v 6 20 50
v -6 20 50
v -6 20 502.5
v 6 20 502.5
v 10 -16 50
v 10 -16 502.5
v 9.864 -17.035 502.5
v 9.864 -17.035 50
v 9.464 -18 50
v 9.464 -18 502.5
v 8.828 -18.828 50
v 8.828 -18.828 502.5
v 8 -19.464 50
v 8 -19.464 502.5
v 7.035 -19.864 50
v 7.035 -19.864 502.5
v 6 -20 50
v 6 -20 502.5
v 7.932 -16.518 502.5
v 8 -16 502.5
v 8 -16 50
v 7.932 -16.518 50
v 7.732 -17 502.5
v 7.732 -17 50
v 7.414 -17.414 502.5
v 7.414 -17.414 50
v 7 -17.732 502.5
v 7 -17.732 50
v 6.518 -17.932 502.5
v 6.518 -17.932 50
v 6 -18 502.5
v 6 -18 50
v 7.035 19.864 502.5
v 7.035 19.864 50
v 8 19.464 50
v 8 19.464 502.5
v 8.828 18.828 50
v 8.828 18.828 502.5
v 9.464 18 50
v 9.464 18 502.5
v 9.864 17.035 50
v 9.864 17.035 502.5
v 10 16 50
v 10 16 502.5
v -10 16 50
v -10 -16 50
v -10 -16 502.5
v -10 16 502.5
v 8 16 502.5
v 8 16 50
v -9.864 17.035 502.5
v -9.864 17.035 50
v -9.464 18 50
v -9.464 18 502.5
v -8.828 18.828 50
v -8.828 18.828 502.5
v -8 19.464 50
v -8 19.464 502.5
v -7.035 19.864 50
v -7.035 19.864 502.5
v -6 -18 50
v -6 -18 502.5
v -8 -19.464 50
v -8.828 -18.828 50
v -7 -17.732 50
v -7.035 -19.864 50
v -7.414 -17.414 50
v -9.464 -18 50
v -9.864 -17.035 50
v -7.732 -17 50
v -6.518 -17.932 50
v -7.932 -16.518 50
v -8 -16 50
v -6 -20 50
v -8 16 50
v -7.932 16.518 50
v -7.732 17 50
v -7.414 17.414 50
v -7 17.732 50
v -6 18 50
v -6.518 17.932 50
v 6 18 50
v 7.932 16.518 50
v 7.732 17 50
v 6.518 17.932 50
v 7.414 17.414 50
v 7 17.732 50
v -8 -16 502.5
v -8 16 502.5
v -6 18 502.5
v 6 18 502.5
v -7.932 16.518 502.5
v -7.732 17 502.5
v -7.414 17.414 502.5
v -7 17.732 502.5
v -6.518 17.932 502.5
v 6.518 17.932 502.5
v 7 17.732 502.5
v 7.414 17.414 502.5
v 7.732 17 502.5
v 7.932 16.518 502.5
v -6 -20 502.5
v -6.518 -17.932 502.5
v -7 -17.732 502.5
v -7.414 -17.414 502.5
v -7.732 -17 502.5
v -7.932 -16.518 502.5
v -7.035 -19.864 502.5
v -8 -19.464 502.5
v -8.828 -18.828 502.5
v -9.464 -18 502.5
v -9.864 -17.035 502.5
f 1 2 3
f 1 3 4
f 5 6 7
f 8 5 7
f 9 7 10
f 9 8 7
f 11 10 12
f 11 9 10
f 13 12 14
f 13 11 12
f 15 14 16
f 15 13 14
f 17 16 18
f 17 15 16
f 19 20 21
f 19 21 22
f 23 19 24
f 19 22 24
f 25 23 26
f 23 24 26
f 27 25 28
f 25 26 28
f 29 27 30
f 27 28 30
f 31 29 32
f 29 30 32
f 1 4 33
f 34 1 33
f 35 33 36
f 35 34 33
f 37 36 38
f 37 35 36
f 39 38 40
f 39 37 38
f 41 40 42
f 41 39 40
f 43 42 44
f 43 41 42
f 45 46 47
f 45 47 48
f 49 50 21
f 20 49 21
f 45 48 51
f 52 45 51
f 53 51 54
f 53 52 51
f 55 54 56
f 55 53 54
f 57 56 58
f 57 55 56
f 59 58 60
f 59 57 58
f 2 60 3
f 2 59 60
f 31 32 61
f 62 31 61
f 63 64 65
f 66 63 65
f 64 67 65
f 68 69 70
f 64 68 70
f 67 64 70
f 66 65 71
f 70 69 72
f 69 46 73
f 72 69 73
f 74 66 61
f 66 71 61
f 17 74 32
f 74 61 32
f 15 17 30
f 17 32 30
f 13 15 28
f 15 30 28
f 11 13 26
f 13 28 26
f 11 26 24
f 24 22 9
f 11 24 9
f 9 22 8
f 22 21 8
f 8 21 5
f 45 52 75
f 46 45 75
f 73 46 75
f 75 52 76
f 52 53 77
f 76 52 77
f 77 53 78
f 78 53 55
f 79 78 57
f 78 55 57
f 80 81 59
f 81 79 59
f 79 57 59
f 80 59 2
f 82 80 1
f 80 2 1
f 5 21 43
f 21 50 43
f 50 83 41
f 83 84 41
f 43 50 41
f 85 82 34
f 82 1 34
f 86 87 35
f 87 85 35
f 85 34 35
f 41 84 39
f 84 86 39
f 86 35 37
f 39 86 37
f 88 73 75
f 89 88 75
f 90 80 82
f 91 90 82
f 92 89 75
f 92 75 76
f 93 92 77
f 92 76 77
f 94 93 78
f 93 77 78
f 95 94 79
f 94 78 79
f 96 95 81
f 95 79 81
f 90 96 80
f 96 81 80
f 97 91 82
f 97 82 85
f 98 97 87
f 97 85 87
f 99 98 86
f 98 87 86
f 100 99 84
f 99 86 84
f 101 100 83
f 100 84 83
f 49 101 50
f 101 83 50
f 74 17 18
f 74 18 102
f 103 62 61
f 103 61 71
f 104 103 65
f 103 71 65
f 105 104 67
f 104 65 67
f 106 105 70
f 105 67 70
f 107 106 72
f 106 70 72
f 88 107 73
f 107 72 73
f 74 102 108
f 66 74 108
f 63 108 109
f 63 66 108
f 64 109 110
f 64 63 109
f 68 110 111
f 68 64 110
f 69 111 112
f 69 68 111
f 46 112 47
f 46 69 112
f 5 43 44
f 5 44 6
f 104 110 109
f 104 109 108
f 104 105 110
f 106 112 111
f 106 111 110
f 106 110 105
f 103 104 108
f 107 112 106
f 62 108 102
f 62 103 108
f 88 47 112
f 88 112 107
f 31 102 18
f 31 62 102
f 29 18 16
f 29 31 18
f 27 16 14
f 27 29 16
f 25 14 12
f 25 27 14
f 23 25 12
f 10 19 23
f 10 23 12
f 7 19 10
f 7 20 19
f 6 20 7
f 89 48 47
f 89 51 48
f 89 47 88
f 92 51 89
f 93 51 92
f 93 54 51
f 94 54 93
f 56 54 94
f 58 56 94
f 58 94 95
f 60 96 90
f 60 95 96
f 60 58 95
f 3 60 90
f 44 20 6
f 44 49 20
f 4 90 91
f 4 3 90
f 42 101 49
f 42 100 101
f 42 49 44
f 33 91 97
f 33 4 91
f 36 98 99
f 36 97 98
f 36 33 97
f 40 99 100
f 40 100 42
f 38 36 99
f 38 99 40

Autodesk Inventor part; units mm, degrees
ref_plane "Plano inicial" through (0, 0, 50) normal (0, 0, 1) x (1, 0, 0)
ref_plane "Plano final" through (0, 0, 502.5) normal (0, 0, 1) x (1, 0, 0)
sketch "Boceto" plane through (0, 0, 0) normal (0, 0, 1) x (1, 0, 0)
  line L0 (-10, -16) -> (-10, 16)
  line L1 (-6, 20) -> (6, 20)
  line L2 (10, 16) -> (10, -16)
  line L3 (6, -20) -> (-6, -20)
  arc A0 (-10, -16) -> (-6, -20) centre (-6, -16) ccw
  arc A1 (10, 16) -> (6, 20) centre (6, 16) ccw
  arc A2 (-6, 20) -> (-10, 16) centre (-6, 16) ccw
  arc A3 (6, -20) -> (10, -16) centre (6, -16) ccw
  arc A4 (-6, 18) -> (-8, 16) centre (-6, 16) ccw
  line L4 (-6, 18) -> (6, 18)
  arc A5 (8, 16) -> (6, 18) centre (6, 16) ccw
  line L5 (8, 16) -> (8, -16)
  arc A6 (6, -18) -> (8, -16) centre (6, -16) ccw
  line L6 (6, -18) -> (-6, -18)
  arc A7 (-8, -16) -> (-6, -18) centre (-6, -16) ccw
  line L7 (-8, -16) -> (-8, 16)
  line L8 (0, 29.1598) -> (0, -29.1598) construction
  line L9 (-15.1598, 0) -> (15.1598, 0) construction
  dimension "d7" = 4
  dimension "d9" = 20
  dimension "d11" = 40
  dimension "d12" = 2
  dimension "d15" = 10
  dimension "d16" = 20
extrude "Cuerpo" add sketch "Boceto" along normal up to surface (452.5 mm away) from surface at 50
sketch "Sketch3" plane through (0, 0, 0) normal (0, 0, 1) x (1, 0, 0)
  line L0 (0, 0) -> (10, 0)
ref_plane "Work Plane3" through (0, 0, 0) normal (0, -1, 0) x (1, 0, 0)
sketch "Sketch4" plane through (0, 0, 0) normal (0, -1, 0) x (1, 0, 0)
  line L0 (-2, 50) -> (12, 50)
  line L1 (-2, 502.5) -> (12, 502.5)
  dimension "d18" = 452.5
ref_plane "Plano de trabajo4" through (-11.25, -155, 502.5) normal (0, 0, 1) x (1, 0, 0)
split "Dividir1" plane through (-11.25, -155, 502.5) removes the side toward (0, 0, 1)
ref_plane "Plano de trabajo5" through (6.25, 20, 50) normal (0, 0, -1) x (-1, 0, 0)
split "Dividir2" plane through (6.25, 20, 50) removes the side toward (0, 0, -1)
equation "\"d7\" = G_IR"
equation "\"d9\" = G_W"
equation "\"d11\" = G_H"
equation "\"d12\" = G_T"
equation "\"d15\" = 0.5 * d9"
equation "\"d16\" = 0.5 * d11"
equation "\"d3\" = G_L"
equation "\"G_W\" = 20"
equation "\"G_H\" = 40"
equation "\"G_T\" = 2"
equation "\"G_IR\" = 4"
equation "\"G_L\" = d18"
equation "\"G_OFFSET_END\" = -47.5"
equation "\"d14\" = G_OFFSET_END + B_L"
equation "\"B_L\" = 550"
properties part number "ISO 4019 - 40x20x2 - 452,5" material "Acero, suave"
